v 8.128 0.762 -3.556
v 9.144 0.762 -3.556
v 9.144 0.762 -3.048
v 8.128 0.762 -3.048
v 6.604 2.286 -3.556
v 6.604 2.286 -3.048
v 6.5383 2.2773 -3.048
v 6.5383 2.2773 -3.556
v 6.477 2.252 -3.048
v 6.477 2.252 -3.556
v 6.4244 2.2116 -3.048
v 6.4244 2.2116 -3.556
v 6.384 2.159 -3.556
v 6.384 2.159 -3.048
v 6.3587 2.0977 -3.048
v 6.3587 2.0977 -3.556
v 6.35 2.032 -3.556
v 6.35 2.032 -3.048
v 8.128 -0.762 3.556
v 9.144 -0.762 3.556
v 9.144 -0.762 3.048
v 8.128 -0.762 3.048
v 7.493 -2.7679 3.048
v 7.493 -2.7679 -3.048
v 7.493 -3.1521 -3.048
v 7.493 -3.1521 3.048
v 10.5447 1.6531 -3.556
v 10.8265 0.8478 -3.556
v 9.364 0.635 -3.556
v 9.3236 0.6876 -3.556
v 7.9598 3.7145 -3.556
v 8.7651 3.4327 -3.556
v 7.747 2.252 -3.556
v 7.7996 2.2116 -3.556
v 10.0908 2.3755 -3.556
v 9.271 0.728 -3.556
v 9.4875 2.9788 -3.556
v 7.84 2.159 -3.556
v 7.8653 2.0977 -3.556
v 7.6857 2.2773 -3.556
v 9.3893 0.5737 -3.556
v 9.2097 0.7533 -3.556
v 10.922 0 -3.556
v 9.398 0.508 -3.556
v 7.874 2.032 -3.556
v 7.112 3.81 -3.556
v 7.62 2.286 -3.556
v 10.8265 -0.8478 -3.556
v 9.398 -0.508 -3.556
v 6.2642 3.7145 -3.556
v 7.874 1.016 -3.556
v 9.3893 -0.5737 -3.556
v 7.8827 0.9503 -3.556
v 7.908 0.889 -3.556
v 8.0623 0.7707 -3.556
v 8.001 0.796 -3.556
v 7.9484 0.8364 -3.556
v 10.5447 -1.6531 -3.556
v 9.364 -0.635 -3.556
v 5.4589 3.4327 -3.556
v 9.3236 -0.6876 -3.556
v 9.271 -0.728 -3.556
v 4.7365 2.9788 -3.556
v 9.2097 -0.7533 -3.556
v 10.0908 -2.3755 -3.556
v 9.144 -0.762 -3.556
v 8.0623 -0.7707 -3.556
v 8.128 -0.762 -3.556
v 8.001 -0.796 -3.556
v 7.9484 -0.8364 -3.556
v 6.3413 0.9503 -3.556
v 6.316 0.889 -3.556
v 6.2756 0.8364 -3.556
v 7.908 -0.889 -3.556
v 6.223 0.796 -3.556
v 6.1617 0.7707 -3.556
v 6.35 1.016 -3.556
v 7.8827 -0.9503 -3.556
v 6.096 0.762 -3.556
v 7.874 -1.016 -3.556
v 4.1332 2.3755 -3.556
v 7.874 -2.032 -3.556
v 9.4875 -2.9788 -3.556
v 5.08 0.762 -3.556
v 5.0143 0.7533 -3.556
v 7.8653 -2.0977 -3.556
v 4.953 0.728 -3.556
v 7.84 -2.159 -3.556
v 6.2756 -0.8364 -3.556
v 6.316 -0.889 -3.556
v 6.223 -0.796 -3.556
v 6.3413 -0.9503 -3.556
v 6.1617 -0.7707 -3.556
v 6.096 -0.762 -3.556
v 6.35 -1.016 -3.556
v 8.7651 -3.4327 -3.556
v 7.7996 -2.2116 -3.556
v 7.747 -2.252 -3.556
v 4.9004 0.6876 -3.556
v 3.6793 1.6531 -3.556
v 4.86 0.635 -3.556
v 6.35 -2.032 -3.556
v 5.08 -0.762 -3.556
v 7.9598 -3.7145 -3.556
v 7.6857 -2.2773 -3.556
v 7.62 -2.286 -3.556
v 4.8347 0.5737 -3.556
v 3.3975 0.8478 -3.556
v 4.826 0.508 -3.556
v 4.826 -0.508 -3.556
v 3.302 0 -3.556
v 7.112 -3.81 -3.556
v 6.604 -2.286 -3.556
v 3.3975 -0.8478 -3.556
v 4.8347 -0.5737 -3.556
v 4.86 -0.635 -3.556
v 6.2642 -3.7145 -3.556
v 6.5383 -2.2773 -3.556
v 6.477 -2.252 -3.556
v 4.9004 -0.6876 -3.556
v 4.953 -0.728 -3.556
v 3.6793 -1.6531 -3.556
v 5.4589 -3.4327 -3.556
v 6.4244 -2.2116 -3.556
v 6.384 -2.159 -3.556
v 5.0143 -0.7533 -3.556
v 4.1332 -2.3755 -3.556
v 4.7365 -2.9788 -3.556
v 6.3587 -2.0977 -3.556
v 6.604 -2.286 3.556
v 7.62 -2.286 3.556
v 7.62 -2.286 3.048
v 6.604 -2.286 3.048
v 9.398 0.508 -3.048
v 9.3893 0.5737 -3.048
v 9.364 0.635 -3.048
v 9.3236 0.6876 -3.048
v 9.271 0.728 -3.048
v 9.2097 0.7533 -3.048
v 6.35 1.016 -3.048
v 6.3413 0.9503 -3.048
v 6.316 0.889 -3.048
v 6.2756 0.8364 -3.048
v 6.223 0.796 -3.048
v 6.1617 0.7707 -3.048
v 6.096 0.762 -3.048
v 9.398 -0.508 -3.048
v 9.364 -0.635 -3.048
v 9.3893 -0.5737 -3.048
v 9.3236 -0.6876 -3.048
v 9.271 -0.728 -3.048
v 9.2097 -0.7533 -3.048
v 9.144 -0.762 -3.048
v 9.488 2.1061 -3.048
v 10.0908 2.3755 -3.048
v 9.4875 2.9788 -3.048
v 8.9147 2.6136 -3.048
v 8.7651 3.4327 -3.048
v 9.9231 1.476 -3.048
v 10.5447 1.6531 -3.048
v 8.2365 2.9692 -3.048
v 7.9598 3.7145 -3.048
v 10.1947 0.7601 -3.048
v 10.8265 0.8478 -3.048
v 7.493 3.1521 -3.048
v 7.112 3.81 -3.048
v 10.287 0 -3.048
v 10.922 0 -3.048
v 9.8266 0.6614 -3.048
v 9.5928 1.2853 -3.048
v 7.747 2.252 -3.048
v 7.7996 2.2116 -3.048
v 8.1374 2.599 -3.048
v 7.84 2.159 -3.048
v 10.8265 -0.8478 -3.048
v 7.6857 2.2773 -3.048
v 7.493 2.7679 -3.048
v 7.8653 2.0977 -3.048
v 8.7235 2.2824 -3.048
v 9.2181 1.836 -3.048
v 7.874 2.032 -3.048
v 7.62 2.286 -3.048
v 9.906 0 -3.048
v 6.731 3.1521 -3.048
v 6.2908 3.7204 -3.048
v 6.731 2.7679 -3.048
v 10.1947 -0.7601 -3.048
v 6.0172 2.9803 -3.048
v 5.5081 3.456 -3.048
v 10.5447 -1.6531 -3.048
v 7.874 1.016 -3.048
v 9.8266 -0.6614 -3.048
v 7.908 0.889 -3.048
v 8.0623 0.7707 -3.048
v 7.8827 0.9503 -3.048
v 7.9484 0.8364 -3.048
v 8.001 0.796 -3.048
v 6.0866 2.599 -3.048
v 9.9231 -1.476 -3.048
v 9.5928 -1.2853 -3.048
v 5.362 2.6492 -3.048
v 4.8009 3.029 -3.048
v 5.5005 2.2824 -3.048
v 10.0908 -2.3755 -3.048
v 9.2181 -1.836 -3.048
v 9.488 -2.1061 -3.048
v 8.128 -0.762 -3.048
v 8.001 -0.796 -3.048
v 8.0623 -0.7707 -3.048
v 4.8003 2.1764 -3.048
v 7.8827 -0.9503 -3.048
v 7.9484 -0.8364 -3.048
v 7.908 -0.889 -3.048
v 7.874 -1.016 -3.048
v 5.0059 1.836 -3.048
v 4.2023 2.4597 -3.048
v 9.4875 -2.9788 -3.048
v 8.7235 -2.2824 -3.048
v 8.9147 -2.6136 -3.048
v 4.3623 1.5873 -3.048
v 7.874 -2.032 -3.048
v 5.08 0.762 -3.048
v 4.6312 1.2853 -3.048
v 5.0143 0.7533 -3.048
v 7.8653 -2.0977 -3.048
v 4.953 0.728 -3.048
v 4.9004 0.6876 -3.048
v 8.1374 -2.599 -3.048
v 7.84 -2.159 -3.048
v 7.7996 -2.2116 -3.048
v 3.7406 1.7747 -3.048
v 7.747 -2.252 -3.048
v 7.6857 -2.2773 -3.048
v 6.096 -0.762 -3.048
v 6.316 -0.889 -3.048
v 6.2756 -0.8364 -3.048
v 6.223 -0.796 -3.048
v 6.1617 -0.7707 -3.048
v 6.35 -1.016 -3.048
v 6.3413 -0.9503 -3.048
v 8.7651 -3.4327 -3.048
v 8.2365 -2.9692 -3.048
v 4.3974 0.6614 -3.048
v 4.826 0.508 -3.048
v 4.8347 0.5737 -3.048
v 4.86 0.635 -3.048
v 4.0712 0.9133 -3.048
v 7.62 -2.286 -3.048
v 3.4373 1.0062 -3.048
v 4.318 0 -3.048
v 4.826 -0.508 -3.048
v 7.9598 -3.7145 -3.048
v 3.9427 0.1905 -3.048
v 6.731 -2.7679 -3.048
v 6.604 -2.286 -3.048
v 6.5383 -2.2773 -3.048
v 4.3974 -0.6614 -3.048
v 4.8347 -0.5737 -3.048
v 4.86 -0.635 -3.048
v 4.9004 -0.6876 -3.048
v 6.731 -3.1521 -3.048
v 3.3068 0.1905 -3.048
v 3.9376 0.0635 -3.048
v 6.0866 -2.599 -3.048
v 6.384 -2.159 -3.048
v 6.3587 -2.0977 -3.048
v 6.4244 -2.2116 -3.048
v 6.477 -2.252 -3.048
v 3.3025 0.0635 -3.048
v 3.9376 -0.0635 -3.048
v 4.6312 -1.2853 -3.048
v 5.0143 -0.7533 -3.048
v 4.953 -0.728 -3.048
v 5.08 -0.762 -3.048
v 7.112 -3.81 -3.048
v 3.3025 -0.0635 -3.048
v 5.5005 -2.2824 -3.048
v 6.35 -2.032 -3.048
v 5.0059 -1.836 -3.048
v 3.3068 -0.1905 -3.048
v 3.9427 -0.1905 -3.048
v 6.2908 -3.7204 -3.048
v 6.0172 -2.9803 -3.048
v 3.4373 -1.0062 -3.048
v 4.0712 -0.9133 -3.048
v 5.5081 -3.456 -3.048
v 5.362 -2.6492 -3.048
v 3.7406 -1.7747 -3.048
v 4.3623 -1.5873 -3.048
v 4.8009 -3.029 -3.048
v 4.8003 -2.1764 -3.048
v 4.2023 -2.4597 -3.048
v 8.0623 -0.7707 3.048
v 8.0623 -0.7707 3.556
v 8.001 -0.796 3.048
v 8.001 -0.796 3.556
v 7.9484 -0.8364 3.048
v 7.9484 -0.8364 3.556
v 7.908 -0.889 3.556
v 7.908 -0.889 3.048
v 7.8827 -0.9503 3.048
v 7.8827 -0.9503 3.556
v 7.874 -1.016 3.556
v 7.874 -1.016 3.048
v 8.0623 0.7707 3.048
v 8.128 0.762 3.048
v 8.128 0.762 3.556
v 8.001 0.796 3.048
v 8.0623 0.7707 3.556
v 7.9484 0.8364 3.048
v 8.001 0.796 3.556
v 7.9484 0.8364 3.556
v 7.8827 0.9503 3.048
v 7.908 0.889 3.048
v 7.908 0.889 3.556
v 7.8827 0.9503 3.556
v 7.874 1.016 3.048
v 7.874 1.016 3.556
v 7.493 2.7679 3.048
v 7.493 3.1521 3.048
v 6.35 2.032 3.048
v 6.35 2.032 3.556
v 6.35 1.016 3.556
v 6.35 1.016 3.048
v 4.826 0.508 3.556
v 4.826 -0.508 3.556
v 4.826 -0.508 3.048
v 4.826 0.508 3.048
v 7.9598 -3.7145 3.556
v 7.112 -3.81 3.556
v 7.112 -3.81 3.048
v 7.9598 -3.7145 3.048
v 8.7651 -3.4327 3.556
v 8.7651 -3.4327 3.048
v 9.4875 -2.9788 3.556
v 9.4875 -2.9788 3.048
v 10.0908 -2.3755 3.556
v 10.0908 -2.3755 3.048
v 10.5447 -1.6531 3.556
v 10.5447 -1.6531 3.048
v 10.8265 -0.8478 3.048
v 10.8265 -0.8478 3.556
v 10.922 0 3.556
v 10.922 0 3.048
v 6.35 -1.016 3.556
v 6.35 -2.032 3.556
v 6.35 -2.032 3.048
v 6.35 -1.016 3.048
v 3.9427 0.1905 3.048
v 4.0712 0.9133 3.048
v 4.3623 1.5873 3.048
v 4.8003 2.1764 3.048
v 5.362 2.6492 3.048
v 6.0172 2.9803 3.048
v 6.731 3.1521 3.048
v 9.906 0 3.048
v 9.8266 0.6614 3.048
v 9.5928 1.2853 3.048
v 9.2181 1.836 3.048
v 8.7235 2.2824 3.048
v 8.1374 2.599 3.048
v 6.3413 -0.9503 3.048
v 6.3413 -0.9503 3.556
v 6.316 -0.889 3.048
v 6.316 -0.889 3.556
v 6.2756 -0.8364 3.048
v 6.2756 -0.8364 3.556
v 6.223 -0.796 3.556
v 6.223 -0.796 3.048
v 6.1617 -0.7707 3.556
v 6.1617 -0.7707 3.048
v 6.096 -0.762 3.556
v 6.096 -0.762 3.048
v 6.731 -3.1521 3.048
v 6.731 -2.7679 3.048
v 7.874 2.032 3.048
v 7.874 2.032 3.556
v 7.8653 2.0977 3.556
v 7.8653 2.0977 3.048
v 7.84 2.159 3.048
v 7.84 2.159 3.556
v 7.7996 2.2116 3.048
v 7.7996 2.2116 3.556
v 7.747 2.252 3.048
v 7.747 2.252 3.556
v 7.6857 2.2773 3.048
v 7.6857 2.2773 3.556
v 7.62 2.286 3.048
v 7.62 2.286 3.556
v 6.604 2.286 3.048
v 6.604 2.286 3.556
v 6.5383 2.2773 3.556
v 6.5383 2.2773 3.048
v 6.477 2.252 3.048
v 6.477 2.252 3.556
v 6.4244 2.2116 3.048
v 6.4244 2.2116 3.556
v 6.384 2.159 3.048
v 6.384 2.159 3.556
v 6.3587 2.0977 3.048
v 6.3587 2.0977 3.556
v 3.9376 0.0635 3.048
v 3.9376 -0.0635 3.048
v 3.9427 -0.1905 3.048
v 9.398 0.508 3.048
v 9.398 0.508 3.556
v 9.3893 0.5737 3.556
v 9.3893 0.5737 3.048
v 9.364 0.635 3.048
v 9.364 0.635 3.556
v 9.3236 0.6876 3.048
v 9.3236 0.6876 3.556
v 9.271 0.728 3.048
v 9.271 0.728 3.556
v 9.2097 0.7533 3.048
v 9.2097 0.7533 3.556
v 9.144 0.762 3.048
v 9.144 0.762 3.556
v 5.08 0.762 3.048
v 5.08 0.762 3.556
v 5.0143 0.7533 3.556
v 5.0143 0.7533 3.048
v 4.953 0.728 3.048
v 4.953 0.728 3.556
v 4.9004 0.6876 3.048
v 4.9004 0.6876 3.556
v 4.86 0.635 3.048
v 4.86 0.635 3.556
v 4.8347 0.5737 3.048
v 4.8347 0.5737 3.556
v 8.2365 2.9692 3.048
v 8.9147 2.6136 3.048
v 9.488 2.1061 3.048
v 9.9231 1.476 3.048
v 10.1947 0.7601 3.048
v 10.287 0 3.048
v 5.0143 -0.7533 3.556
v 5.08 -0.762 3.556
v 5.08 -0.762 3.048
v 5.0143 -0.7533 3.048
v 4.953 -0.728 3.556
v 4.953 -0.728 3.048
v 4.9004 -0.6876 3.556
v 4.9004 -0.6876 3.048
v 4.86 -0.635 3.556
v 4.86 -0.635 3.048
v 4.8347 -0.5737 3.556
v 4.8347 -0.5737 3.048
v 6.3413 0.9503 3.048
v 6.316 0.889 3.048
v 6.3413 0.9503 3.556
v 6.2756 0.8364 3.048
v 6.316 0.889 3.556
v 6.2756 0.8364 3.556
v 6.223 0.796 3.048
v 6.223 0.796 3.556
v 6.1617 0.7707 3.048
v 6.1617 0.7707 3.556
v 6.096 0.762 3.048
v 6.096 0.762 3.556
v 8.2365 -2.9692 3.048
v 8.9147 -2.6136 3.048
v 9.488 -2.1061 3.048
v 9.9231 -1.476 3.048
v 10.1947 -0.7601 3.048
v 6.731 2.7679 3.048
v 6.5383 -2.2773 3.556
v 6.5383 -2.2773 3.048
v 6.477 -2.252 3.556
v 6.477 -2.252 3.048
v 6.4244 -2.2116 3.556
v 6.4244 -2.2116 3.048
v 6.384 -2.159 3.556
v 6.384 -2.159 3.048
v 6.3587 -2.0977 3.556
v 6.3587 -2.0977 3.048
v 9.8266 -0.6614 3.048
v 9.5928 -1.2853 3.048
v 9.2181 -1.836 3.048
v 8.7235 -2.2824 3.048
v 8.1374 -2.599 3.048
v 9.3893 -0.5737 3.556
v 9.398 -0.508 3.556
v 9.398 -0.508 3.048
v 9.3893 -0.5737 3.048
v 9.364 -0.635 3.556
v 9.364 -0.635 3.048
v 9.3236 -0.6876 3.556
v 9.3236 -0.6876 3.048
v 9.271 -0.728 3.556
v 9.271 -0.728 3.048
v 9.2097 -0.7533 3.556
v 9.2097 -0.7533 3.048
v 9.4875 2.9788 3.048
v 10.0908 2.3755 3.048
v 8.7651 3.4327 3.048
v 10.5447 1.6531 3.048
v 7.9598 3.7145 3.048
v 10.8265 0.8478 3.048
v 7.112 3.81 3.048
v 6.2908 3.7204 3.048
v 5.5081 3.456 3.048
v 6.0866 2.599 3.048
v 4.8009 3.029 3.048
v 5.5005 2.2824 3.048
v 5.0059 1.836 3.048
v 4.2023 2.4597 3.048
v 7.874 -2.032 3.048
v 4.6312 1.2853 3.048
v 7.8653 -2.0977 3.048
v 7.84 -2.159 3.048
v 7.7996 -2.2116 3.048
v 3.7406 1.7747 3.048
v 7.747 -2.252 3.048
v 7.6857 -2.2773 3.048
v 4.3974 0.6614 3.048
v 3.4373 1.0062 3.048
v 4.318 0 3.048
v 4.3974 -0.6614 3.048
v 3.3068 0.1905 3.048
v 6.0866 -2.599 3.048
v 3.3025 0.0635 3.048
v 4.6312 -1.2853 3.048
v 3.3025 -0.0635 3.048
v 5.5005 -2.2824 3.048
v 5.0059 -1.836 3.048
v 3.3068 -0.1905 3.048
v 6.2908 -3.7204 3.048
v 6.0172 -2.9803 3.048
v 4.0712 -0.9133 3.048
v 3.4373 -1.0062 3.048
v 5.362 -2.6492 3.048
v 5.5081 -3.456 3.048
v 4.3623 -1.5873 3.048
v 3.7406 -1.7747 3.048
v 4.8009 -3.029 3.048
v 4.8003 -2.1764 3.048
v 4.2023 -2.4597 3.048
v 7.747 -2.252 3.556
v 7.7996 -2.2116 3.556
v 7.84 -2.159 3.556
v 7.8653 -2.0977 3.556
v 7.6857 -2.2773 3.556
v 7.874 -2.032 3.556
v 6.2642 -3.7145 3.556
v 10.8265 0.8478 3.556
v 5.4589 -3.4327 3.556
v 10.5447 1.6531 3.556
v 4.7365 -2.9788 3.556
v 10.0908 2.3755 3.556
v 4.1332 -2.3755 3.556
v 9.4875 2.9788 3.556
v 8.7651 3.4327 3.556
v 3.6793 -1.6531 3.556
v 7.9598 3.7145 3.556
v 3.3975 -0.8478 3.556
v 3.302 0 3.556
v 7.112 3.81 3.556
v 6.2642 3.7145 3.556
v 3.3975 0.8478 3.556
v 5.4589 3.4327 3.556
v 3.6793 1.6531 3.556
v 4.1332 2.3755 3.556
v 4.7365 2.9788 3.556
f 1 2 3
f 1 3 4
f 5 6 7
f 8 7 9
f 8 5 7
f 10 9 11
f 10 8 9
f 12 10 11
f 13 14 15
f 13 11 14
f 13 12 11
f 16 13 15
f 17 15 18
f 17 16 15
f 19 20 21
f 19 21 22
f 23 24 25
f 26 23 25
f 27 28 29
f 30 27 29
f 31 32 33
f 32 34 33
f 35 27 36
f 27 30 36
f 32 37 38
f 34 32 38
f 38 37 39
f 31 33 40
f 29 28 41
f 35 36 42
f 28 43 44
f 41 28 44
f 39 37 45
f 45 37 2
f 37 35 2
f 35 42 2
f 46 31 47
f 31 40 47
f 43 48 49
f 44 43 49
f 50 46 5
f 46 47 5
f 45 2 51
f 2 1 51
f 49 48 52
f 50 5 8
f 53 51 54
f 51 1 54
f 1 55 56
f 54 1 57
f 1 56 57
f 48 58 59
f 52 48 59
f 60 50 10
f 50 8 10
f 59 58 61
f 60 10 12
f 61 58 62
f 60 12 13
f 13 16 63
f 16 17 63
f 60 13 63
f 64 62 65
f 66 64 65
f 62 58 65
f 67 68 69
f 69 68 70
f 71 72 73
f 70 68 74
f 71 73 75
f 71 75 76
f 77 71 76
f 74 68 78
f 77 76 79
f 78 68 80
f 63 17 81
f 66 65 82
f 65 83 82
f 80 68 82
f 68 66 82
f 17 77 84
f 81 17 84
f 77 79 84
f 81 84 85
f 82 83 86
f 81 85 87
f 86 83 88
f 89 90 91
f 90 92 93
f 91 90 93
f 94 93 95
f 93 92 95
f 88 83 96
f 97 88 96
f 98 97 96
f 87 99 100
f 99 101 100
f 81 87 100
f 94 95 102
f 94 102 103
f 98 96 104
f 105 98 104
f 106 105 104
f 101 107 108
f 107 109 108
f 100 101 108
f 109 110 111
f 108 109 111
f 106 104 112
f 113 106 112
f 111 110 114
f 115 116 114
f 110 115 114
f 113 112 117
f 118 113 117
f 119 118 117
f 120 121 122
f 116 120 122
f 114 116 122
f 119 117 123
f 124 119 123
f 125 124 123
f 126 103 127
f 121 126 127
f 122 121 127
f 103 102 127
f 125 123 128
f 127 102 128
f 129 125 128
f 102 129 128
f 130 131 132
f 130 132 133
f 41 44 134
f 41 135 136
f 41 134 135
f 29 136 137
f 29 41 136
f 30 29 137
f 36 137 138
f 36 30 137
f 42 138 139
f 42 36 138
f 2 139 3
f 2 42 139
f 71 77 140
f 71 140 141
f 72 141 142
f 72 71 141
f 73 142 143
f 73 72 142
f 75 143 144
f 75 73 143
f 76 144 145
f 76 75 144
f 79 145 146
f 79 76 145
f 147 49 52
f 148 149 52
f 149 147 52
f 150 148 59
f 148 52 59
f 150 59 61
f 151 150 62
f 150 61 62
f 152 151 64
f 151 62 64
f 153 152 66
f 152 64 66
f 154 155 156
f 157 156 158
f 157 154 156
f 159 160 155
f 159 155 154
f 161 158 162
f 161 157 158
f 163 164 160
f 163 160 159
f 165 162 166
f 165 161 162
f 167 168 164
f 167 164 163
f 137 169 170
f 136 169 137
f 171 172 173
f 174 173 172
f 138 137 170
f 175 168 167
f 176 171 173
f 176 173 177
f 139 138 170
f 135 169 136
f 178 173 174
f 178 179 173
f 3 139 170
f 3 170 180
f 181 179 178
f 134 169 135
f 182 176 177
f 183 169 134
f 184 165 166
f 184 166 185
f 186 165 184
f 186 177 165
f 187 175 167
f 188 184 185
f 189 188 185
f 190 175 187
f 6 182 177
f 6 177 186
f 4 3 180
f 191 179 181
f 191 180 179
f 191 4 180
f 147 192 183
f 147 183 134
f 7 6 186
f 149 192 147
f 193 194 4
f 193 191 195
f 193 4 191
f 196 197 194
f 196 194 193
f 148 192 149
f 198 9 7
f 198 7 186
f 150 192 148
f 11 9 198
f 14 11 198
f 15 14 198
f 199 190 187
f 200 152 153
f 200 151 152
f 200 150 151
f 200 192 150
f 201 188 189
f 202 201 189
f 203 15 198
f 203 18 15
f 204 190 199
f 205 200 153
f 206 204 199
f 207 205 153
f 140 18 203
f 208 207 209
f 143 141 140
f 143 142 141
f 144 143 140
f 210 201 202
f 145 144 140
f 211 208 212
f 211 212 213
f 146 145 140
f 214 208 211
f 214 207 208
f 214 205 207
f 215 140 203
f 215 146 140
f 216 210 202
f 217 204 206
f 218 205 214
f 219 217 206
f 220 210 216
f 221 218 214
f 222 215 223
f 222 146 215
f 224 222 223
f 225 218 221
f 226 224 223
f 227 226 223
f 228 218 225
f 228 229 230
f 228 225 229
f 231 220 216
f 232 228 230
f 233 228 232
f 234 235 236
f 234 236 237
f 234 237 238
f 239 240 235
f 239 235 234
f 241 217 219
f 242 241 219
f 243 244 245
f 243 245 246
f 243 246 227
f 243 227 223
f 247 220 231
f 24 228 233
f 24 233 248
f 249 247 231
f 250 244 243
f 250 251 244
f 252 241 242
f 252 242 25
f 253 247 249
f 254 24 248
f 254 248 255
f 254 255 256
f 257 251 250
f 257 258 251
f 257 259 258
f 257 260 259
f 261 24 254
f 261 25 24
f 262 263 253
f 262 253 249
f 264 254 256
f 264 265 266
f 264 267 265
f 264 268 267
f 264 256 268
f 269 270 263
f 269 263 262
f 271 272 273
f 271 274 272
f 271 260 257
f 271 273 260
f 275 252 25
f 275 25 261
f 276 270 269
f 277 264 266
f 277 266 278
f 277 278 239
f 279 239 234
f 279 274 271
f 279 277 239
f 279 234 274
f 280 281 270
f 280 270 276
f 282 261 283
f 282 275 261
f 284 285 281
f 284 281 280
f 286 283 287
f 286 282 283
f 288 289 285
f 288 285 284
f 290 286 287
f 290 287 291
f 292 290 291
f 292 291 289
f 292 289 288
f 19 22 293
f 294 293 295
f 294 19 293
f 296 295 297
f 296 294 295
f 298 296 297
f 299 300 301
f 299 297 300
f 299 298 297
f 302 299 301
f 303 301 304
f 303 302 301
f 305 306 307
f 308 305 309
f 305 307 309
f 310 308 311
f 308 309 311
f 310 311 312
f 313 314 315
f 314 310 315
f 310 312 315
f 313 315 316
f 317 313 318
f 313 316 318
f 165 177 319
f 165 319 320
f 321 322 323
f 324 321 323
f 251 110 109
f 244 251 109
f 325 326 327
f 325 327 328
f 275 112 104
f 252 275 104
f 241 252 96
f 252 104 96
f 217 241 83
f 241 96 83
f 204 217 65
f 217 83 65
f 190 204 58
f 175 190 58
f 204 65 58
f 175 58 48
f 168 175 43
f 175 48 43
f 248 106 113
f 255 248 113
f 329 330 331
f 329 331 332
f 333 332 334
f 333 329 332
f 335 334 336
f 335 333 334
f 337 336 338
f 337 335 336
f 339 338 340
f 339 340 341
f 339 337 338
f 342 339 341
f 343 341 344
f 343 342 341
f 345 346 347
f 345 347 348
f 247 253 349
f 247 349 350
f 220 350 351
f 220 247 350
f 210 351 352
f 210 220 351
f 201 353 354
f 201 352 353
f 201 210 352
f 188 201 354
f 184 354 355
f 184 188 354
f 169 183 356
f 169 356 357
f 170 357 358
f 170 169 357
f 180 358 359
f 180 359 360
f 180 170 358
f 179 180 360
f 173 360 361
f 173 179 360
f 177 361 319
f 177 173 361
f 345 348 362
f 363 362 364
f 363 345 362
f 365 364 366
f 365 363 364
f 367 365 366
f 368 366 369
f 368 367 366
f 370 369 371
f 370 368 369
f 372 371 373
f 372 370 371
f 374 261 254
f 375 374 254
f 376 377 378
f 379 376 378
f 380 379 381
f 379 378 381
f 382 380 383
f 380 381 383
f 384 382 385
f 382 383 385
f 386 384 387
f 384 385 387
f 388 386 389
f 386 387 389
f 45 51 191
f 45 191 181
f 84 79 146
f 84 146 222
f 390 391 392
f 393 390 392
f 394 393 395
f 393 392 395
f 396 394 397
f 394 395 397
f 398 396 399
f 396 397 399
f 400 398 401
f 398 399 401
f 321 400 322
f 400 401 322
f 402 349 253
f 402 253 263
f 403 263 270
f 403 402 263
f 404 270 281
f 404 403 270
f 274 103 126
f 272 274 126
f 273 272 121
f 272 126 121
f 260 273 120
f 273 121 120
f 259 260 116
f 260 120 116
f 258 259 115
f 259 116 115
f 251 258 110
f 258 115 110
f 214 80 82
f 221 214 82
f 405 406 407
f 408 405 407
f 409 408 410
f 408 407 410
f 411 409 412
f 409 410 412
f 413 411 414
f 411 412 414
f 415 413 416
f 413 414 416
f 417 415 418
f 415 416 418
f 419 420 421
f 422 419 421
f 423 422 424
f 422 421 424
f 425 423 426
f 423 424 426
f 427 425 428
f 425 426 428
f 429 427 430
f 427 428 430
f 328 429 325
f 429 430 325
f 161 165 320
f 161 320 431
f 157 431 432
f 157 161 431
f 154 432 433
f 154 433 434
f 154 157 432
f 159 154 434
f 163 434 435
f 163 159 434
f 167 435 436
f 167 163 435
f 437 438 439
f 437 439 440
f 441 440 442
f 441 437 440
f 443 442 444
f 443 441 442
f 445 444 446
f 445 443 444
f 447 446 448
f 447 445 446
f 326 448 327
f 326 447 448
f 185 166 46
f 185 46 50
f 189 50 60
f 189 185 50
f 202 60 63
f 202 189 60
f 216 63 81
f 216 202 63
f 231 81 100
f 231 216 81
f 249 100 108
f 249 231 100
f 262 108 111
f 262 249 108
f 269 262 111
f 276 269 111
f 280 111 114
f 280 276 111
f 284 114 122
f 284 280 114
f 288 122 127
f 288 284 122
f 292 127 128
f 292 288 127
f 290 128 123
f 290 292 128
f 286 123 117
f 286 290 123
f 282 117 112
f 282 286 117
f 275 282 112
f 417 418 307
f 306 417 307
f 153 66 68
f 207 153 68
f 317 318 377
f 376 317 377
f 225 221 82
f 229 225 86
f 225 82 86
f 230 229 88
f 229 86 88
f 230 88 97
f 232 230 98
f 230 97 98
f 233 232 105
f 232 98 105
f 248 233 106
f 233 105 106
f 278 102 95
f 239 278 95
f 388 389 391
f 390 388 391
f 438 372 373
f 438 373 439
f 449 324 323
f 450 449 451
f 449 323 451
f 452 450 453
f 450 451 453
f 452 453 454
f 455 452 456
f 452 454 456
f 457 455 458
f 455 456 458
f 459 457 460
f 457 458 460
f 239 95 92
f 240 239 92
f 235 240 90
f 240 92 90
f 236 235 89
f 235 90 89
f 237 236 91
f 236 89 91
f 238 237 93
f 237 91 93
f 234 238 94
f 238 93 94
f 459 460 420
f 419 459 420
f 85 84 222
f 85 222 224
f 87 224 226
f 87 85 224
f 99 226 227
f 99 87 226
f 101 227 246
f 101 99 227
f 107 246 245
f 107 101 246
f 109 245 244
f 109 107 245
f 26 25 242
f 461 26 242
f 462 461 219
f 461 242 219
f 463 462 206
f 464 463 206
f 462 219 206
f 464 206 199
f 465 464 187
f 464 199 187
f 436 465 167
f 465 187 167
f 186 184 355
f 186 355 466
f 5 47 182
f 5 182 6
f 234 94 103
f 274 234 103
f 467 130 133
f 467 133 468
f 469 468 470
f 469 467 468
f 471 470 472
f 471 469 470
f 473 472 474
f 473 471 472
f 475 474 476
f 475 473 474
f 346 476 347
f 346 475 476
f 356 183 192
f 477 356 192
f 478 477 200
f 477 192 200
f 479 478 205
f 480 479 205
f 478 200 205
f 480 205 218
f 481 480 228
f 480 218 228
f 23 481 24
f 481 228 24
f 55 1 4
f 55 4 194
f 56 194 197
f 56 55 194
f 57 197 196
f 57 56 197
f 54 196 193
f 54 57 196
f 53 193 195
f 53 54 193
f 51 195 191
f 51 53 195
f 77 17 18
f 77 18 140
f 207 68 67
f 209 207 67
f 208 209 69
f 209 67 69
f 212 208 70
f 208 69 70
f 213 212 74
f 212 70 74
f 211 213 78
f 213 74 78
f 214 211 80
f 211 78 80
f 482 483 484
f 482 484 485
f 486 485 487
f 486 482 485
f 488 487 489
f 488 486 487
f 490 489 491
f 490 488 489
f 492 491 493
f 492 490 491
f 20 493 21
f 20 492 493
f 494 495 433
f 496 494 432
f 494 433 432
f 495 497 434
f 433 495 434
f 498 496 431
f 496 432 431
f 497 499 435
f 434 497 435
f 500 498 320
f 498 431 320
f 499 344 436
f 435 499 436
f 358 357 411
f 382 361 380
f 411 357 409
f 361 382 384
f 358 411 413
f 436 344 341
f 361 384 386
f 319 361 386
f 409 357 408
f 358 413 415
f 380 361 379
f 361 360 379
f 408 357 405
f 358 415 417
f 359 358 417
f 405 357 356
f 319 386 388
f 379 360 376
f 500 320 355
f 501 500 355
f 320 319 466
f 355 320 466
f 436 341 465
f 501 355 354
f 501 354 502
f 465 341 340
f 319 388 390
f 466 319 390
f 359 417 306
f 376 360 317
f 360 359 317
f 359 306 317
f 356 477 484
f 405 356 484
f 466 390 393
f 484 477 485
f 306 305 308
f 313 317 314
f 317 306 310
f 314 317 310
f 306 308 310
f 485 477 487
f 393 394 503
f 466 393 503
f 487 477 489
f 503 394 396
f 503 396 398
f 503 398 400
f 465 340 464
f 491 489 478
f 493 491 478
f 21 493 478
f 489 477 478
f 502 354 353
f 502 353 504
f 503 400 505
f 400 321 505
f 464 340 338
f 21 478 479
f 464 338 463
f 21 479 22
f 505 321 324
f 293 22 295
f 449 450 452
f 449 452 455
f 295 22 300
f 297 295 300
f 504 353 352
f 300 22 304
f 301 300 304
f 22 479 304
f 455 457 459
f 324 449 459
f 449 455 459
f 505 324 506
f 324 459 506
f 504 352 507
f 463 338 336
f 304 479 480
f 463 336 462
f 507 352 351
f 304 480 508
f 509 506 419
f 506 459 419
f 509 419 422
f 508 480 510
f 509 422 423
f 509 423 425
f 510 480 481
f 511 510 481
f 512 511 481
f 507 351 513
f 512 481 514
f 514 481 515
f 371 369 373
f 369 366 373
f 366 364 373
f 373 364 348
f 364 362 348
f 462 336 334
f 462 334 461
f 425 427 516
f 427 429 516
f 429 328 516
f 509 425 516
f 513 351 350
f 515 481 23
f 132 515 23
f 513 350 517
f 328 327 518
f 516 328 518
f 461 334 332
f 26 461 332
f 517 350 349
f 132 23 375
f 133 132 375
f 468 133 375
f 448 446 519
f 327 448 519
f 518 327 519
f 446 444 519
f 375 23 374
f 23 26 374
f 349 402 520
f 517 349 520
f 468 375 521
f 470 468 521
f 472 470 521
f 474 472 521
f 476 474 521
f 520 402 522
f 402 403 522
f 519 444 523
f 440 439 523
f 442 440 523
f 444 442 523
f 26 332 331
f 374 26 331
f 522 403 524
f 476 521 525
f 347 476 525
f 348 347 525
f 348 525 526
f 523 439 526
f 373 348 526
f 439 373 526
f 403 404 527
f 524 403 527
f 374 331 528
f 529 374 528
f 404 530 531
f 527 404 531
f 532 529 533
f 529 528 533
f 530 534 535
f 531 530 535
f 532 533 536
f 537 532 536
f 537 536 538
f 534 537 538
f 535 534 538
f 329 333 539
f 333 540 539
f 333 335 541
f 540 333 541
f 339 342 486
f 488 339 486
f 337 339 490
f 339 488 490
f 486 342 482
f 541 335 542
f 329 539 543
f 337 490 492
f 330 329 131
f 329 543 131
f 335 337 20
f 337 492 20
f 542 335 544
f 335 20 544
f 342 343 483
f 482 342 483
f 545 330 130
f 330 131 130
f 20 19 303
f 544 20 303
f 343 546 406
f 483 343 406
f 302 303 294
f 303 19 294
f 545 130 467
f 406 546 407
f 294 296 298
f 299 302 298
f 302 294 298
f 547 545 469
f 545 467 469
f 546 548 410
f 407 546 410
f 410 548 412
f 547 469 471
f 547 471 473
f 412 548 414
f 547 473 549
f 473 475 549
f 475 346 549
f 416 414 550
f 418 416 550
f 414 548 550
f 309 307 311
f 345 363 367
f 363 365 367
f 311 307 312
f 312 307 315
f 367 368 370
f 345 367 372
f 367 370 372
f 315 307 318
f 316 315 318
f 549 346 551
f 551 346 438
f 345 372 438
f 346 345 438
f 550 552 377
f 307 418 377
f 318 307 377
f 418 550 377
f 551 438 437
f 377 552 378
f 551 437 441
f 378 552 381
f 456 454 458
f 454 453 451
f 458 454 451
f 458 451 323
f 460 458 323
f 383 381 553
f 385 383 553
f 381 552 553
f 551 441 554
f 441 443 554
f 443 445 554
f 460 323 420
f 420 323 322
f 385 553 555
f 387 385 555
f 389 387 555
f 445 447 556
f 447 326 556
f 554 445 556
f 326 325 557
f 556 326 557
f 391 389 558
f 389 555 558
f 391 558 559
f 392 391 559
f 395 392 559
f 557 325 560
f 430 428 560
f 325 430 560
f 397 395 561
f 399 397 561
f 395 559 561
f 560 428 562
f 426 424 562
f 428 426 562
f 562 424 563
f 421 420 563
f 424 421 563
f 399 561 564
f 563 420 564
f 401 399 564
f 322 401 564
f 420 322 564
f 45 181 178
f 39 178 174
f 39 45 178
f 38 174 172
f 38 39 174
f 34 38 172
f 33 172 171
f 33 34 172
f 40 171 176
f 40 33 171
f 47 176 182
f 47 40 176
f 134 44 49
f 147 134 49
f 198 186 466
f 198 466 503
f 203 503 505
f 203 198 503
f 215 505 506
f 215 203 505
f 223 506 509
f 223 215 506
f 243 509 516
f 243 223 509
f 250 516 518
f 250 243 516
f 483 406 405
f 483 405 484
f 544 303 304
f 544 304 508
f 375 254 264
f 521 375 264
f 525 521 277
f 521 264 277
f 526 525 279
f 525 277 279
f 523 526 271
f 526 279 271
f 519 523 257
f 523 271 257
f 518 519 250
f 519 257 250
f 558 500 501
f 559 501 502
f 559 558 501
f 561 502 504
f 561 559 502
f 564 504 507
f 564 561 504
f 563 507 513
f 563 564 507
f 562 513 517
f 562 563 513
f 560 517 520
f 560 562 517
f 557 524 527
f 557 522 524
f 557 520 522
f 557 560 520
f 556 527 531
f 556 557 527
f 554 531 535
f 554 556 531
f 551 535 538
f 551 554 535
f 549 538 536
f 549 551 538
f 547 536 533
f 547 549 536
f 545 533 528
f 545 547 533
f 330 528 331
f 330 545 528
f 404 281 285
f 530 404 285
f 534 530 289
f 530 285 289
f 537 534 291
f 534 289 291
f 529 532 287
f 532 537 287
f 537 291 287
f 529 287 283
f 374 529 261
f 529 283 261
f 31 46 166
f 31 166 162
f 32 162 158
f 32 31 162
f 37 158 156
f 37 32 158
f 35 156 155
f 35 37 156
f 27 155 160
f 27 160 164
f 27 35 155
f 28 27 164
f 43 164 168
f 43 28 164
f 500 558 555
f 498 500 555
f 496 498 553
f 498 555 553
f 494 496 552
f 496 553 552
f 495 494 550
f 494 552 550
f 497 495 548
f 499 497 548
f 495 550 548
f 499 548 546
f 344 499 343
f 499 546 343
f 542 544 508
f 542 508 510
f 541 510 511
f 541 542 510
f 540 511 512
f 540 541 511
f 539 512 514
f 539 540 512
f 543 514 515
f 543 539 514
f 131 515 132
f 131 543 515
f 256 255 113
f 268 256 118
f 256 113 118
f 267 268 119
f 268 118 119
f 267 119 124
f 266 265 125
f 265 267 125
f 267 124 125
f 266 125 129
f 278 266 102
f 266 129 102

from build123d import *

# Parameters (mm, degrees)
EXTRUDE1_DEPTH     = 3.81
EXTRUDE2_DEPTH     = 0.508
CUT_EXTRUDE2_DEPTH = 15.094711526
EXTRUDE3_DEPTH     = 3.048
EXTRUDE4_REACH     = 14.678
SKETCH9_W          = 3.045663376
SKETCH9_H          = 0.1905
SKETCH11_R         = 2.286
CUT_EXTRUDE3_DEPTH = 13.677755519
SKETCH12_R         = 3.175
CUT_EXTRUDE4_DEPTH = 0.508
SKETCH13_OUTSIDE_W = 29.435
SKETCH13_OUTSIDE_H = 14.576
SKETCH13_OUTSIDE_R = 3.81
CUT_EXTRUDE5_DEPTH = 15.094711526
CUT_EXTRUDE7_START = 6.096
CUT_EXTRUDE7_DEPTH = 6.096


with BuildPart() as part:
    # Sketch1 → Extrude1 (new body)
    with BuildSketch(Plane(origin=(0, 0, 0), x_dir=(1, 0, 0), z_dir=(0, 1, 0))):
        with BuildLine():
            Line((-8.001, 3.556), (0, 3.556))
            ThreePointArc((0, 3.556), (3.556, 0), (0, -3.556))
            Line((0, -3.556), (-8.001, -3.556))
            ThreePointArc((-8.001, -3.556), (-11.557, 0), (-8.001, 3.556))
        make_face()
    extrude(amount=EXTRUDE1_DEPTH)

    # Sketch4 → Extrude2 (add)
    with BuildSketch(Plane.XY.offset(3.556)):
        with BuildLine():
            Line((0, 0), (0, 3.81))
            Line((0, 3.81), (7.112, 3.81))
            ThreePointArc((7.112, 3.81), (9.806076836, 2.694076836), (10.922, 0))
            Line((10.922, 0), (7.112, 0))
            Line((7.112, 0), (0, 0))
        make_face()
    extrude2 = extrude(amount=-EXTRUDE2_DEPTH)

    # Sketch6 → Cut-Extrude2 (cut, through all)
    with BuildSketch(Plane.XY.offset(3.556)):
        with BuildLine():
            Line((6.35, 2.032), (6.35, 1.016))
            ThreePointArc((6.35, 1.016), (6.275605122, 0.836394878), (6.096, 0.762))
            Line((6.096, 0.762), (5.08, 0.762))
            ThreePointArc((5.08, 0.762), (4.900394878, 0.687605122), (4.826, 0.508))
            Line((4.826, 0.508), (4.826, -0.508))
            ThreePointArc((4.826, -0.508), (4.900394878, -0.687605122), (5.08, -0.762))
            Line((5.08, -0.762), (6.096, -0.762))
            ThreePointArc((6.096, -0.762), (6.275605122, -0.836394878), (6.35, -1.016))
            Line((6.35, -1.016), (6.35, -2.032))
            ThreePointArc((6.35, -2.032), (6.424394878, -2.211605122), (6.604, -2.286))
            Line((6.604, -2.286), (7.62, -2.286))
            ThreePointArc((7.62, -2.286), (7.799605122, -2.211605122), (7.874, -2.032))
            Line((7.874, -2.032), (7.874, -1.016))
            ThreePointArc((7.874, -1.016), (7.948394878, -0.836394878), (8.128, -0.762))
            Line((8.128, -0.762), (9.144, -0.762))
            ThreePointArc((9.144, -0.762), (9.323605122, -0.687605122), (9.398, -0.508))
            Line((9.398, -0.508), (9.398, 0.508))
            ThreePointArc((9.398, 0.508), (9.323605122, 0.687605122), (9.144, 0.762))
            Line((9.144, 0.762), (8.128, 0.762))
            ThreePointArc((8.128, 0.762), (7.948394878, 0.836394878), (7.874, 1.016))
            Line((7.874, 1.016), (7.874, 2.032))
            ThreePointArc((7.874, 2.032), (7.799605122, 2.211605122), (7.62, 2.286))
            Line((7.62, 2.286), (6.604, 2.286))
            ThreePointArc((6.604, 2.286), (6.424394878, 2.211605122), (6.35, 2.032))
        make_face()
    cut_extrude2 = extrude(amount=-CUT_EXTRUDE2_DEPTH, mode=Mode.SUBTRACT)

    # Sketch8 → Extrude3 (add)
    with BuildSketch(Plane(origin=(0, 0, 3.048), x_dir=(-1, 0, 0), z_dir=(0, 0, -1))):
        with BuildLine():
            Line((-10.287, 0), (-9.906, 0))
            ThreePointArc((-9.906, 0), (-9.218056742, 1.836017701), (-7.493, 2.767900829))
            Line((-7.493, 2.767900829), (-7.493, 3.152057106))
            ThreePointArc((-7.493, 3.152057106), (-9.487952441, 2.106056742), (-10.287, 0))
        make_face()
        with BuildLine():
            Line((-4.318, 0), (-3.937, 0))
            ThreePointArc((-3.937, 0), (-4.736047559, 2.106056742), (-6.731, 3.152057106))
            Line((-6.731, 3.152057106), (-6.731, 2.767900829))
            ThreePointArc((-6.731, 2.767900829), (-5.005943258, 1.836017701), (-4.318, 0))
        make_face()
    extrude3 = extrude(amount=EXTRUDE3_DEPTH)

    # Sketch9 → Extrude4 (add, up to next)
    with BuildSketch(Plane(origin=(0, 0, 0), x_dir=(-1, 0, 0), z_dir=(0, 0, -1)), mode=Mode.PRIVATE) as extrude4_sk1:
        with Locations((-2.604668312, 0.09525)):
            Rectangle(SKETCH9_W, SKETCH9_H)
    extrude4_tool1 = extrude(extrude4_sk1.sketch, amount=-EXTRUDE4_REACH, mode=Mode.PRIVATE) - part.part
    extrude4 = extrude4_tool1.solids().sort_by_distance((2.604668, 0.09525, 0))[0]
    add(extrude4)

    # Mirror5: Extrude2, Cut-Extrude2, Extrude3, Extrude4 across plane
    add(extrude2.mirror(Plane(origin=(7.112, 0, 0), x_dir=(1, 0, 0), z_dir=(0, 0, -1))))
    add(cut_extrude2.mirror(Plane(origin=(7.112, 0, 0), x_dir=(1, 0, 0), z_dir=(0, 0, -1))), mode=Mode.SUBTRACT)
    add(extrude3.mirror(Plane(origin=(7.112, 0, 0), x_dir=(1, 0, 0), z_dir=(0, 0, -1))))
    add(extrude4.mirror(Plane(origin=(7.112, 0, 0), x_dir=(1, 0, 0), z_dir=(0, 0, -1))))

    # Sketch11 → Cut-Extrude3 (cut, through all)
    with BuildSketch(Plane(origin=(0, 3.81, 0), x_dir=(1, 0, 0), z_dir=(0, 1, 0))):
        with Locations(Location((0, 0, 0), (0, 0, 270))):
            Circle(SKETCH11_R)
        with Locations(Location((-8.001, 0, 0), (0, 0, 270))):
            Circle(SKETCH11_R)
    extrude(amount=-CUT_EXTRUDE3_DEPTH, mode=Mode.SUBTRACT)

    # Sketch12 → Cut-Extrude4 (cut)
    with BuildSketch(Plane(origin=(0, 3.81, 0), x_dir=(1, 0, 0), z_dir=(0, 1, 0))):
        with Locations(Location((0, 0, 0), (0, 0, 270))):
            Circle(SKETCH12_R)
        with Locations(Location((-8.001, 0, 0), (0, 0, 270))):
            Circle(SKETCH12_R)
    extrude(amount=-CUT_EXTRUDE4_DEPTH, mode=Mode.SUBTRACT)

    # Mirror6: part across face


with BuildPart() as part_1:
    add(part.part)
    add(part.part.mirror(Plane(origin=(-2.880961452, 0, 0), x_dir=(0, 0, 1), z_dir=(0, -1, 0))))

    # Sketch13 outside → Cut-Extrude5 (cut, through all)
    with BuildSketch(Plane.XY.offset(3.556)):
        with Locations((-0.3175, 0)):
            Rectangle(SKETCH13_OUTSIDE_W, SKETCH13_OUTSIDE_H)
        with Locations((7.112, 0)):
            Circle(SKETCH13_OUTSIDE_R, mode=Mode.SUBTRACT)
    extrude(amount=-CUT_EXTRUDE5_DEPTH, mode=Mode.SUBTRACT)

    # Sketch15 → Cut-Extrude7 (cut)
    with BuildSketch(Plane.XY.offset(-3.048).offset(CUT_EXTRUDE7_START)):
        with BuildLine():
            Line((4.158713877, 2.407114678), (5.041631935, 2.407114678))
            ThreePointArc((5.041631935, 2.407114678), (3.937, 0), (5.041631935, -2.407114678))
            Line((5.041631935, -2.407114678), (4.158713877, -2.407114678))
            ThreePointArc((4.158713877, -2.407114678), (3.302, 0), (4.158713877, 2.407114678))
        make_face()
    extrude(amount=-CUT_EXTRUDE7_DEPTH, mode=Mode.SUBTRACT)


solid = part_1.part
